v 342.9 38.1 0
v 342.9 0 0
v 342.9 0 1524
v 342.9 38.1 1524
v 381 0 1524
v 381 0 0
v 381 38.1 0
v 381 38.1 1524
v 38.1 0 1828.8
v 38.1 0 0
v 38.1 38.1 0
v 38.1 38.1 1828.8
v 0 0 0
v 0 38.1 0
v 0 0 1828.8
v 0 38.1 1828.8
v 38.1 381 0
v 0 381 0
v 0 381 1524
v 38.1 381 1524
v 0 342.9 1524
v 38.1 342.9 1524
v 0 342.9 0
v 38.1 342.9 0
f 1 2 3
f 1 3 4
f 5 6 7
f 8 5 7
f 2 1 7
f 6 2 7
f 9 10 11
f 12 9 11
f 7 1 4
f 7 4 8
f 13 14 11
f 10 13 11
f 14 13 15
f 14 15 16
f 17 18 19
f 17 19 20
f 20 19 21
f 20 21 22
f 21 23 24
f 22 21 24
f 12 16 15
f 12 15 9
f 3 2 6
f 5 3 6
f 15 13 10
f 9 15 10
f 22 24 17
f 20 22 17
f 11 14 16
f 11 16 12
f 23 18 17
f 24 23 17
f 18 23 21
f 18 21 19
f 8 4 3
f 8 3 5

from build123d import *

# Parameters (mm, degrees)
F0_W     = 38.1
F0_H     = 38.1
F1_DEPTH = 1828.8
F2_DEPTH = 1524


with BuildPart() as f1:
    # F0 (on Top) → F1 (new body)
    with BuildSketch(Plane.XY):
        with Locations((19.05, 19.05)):
            Rectangle(F0_W, F0_H)
    extrude(amount=F1_DEPTH)


with BuildPart() as f2:
    # F0 (on Top) → F2 (new body)
    with BuildSketch(Plane.XY):
        with Locations((19.05, 361.95)):
            Rectangle(F0_W, F0_H)
        with Locations((361.95, 19.05)):
            Rectangle(F0_W, F0_H)
    extrude(amount=F2_DEPTH)


solid = Compound([f1.part, f2.part])
